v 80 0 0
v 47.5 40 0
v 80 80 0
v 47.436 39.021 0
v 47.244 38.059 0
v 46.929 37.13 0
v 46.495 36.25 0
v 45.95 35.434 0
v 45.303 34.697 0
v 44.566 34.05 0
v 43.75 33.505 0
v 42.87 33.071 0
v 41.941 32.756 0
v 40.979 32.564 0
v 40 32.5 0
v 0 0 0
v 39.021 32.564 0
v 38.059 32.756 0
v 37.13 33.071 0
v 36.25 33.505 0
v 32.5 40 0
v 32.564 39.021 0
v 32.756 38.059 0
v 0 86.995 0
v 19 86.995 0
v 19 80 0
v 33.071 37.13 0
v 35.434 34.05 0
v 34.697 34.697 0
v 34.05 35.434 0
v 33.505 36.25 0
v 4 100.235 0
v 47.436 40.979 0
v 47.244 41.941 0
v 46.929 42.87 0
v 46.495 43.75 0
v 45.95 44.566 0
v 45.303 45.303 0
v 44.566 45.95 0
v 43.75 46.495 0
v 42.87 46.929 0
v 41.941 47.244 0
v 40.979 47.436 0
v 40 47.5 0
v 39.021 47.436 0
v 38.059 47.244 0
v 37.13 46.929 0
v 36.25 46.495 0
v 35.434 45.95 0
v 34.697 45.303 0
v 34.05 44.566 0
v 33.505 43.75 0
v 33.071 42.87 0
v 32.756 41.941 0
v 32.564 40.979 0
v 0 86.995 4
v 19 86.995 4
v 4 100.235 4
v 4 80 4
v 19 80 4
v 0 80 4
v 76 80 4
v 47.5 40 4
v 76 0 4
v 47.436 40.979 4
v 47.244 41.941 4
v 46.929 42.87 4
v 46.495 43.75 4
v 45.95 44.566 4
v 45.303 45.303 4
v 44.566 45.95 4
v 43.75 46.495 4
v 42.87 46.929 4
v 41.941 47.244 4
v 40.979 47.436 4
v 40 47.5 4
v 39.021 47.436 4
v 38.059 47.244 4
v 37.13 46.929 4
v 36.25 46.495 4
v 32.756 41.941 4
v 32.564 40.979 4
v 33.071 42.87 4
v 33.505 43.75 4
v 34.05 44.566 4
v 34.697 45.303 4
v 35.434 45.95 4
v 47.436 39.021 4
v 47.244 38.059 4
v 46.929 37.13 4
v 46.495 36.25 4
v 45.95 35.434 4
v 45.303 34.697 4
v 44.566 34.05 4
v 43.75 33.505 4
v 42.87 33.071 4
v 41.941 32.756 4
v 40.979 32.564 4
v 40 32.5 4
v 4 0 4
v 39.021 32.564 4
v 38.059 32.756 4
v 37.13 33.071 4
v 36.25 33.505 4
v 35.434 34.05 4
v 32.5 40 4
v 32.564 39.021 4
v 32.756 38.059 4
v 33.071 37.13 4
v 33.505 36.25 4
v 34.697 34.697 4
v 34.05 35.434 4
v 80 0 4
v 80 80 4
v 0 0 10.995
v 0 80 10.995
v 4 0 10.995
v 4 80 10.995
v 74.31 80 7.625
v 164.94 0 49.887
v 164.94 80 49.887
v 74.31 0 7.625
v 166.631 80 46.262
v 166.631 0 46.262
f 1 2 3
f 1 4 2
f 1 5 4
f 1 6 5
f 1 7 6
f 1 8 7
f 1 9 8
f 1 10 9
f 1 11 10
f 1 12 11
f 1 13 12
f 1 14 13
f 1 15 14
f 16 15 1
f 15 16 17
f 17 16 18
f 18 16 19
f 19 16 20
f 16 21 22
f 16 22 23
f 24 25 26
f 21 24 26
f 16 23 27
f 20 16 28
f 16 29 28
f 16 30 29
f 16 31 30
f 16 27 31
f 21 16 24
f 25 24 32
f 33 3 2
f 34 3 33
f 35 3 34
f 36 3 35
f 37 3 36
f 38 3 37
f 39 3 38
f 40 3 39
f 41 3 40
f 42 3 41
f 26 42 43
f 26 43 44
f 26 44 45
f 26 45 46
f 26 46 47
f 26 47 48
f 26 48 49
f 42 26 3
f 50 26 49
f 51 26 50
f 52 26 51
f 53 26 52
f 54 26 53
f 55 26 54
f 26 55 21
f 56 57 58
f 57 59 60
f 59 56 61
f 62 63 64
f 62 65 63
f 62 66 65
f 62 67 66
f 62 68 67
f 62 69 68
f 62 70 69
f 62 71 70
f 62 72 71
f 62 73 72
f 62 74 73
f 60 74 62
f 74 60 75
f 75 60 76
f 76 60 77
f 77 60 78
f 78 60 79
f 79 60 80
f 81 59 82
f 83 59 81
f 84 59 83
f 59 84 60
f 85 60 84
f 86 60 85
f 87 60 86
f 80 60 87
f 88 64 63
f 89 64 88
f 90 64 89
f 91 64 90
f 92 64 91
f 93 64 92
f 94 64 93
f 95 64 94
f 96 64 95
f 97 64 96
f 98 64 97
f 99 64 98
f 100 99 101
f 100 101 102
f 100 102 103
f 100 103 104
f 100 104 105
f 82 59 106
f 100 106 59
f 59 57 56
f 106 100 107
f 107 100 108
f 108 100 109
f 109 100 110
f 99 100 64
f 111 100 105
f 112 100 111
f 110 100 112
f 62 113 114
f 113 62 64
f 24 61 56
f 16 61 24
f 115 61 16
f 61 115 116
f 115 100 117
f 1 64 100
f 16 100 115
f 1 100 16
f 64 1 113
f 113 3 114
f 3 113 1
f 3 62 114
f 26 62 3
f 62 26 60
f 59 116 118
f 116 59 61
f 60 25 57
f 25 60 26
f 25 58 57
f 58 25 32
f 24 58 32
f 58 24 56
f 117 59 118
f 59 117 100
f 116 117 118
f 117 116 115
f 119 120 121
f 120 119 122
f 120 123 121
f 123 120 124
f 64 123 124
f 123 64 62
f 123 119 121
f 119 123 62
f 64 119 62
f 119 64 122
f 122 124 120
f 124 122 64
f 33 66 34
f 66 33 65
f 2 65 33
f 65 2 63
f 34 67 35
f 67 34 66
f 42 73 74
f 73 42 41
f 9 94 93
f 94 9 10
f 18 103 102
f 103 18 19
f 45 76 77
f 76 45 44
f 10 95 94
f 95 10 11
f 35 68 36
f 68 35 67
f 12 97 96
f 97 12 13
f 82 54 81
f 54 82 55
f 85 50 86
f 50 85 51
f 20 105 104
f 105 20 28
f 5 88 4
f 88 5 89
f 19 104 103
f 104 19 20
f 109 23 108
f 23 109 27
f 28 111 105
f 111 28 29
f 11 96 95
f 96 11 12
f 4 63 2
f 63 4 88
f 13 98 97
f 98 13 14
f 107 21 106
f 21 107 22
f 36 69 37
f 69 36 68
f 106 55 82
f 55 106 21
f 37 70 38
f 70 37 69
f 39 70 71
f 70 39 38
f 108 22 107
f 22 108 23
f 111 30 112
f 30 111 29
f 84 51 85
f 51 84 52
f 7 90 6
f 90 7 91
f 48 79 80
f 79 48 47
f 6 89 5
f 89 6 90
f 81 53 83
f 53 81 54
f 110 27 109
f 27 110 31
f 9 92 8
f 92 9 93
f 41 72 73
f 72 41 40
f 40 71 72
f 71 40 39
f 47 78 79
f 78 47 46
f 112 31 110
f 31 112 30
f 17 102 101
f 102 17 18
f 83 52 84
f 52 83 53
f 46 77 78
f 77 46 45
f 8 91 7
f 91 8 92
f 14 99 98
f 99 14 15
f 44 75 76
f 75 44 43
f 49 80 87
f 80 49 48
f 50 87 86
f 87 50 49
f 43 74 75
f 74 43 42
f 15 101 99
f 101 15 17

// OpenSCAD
// Adjustable Phone/Tablet Stand
// Parametric stand with customizable angle and size

// === Device Parameters ===
device_width = 80;       // [50:200] Device width in mm
device_thickness = 12;   // [6:20] Device thickness (with case)

// === Stand Parameters ===  
stand_angle = 65;        // [45:85] Viewing angle in degrees
stand_depth = 80;        // [50:150] Base depth in mm
stand_height = 100;      // [60:200] Back support height in mm

// === Construction ===
material_thickness = 4;  // [2:0.5:8] Material thickness
slot_depth = 15;         // [10:30] How deep device sits in slot

// === Features ===
cable_hole = true;       // Add cable pass-through hole
cable_diameter = 15;     // [8:25] Cable hole diameter
add_feet = true;         // Add anti-slip feet

// === Quality ===
$fn = 48;

module stand_profile() {
    // 2D profile of the stand side
    polygon([
        [0, 0],                                          // Front bottom
        [stand_depth, 0],                                // Back bottom
        [stand_depth, material_thickness],               // Back bottom inner
        [stand_depth - material_thickness, material_thickness], // Base top back
        [slot_depth + material_thickness, material_thickness],  // Base top front (behind slot)
        [slot_depth + material_thickness, slot_depth * tan(90 - stand_angle) + material_thickness], // Slot back
        [material_thickness, slot_depth * tan(90 - stand_angle) + material_thickness + device_thickness / sin(stand_angle)], // Slot front top
        [0, slot_depth * tan(90 - stand_angle) + material_thickness], // Front face bottom of slot
        [0, 0]                                           // Close
    ]);
}

module back_support() {
    // Back angled support
    translate([stand_depth - material_thickness, 0, material_thickness]) {
        rotate([0, -90 + stand_angle, 0]) {
            cube([stand_height, device_width, material_thickness]);
        }
    }
}

module cable_cutout() {
    if (cable_hole) {
        translate([stand_depth/2, device_width/2, -1])
            cylinder(h = material_thickness + 2, d = cable_diameter);
    }
}

module foot() {
    cylinder(h = 2, d1 = 10, d2 = 8);
}

module stand() {
    difference() {
        union() {
            // Left side
            linear_extrude(material_thickness)
                stand_profile();
            
            // Right side
            translate([0, device_width - material_thickness, 0])
                linear_extrude(material_thickness)
                stand_profile();
            
            // Base plate
            cube([stand_depth, device_width, material_thickness]);
            
            // Front lip
            cube([material_thickness, device_width, slot_depth * tan(90 - stand_angle) + material_thickness]);
            
            // Back support
            back_support();
        }
        
        // Cable hole
        cable_cutout();
    }
    
    // Feet
    if (add_feet) {
        translate([10, 10, 0]) foot();
        translate([10, device_width - 10, 0]) foot();
        translate([stand_depth - 10, 10, 0]) foot();
        translate([stand_depth - 10, device_width - 10, 0]) foot();
    }
}

stand();
